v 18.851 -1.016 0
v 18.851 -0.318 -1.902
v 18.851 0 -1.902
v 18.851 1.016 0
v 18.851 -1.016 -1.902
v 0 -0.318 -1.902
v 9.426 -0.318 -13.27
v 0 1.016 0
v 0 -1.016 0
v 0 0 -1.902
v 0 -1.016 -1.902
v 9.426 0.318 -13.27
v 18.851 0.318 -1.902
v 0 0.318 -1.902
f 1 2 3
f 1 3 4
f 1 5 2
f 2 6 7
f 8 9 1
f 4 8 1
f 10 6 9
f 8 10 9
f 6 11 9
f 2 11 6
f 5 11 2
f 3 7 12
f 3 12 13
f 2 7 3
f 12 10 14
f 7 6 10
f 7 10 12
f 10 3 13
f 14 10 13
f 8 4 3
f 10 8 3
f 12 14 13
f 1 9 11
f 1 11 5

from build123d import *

# Parameters (mm, degrees)
F0_W     = 18.8512783498
F0_H     = 1.9018952735
F1_DEPTH = 1.016
F2_DEPTH = 0.3175
F4_DEPTH = 50.8


with BuildPart() as f1:
    # F0 (on Front) → F1 (new body, symmetric)
    with BuildSketch(Plane.XZ):
        with Locations((9.4256391749, -0.9509476367)):
            Rectangle(F0_W, F0_H)
    extrude(amount=F1_DEPTH, both=True)

    # F0 (on Front) → F2 (join, symmetric)
    with BuildSketch(Plane.XZ):
        with Locations((9.4256391749, -0.9509476367)):
            Rectangle(F0_W, F0_H)
        Polygon((18.8512783498, -1.9018952735), (0, -1.9018952735), (9.4256391749, -13.2702235132), align=None)
    extrude(amount=F2_DEPTH, both=True)

    # F3 (on face) → F4 (cut, symmetric)
    with BuildSketch(Plane.YZ.offset(18.8512783498)):
        Polygon((1.016, -1.9018952735), (1.016, 0), (0, -1.9018952735), (0.3175, -1.9018952735), align=None)
    extrude(amount=F4_DEPTH, both=True, mode=Mode.SUBTRACT)


solid = f1.part
